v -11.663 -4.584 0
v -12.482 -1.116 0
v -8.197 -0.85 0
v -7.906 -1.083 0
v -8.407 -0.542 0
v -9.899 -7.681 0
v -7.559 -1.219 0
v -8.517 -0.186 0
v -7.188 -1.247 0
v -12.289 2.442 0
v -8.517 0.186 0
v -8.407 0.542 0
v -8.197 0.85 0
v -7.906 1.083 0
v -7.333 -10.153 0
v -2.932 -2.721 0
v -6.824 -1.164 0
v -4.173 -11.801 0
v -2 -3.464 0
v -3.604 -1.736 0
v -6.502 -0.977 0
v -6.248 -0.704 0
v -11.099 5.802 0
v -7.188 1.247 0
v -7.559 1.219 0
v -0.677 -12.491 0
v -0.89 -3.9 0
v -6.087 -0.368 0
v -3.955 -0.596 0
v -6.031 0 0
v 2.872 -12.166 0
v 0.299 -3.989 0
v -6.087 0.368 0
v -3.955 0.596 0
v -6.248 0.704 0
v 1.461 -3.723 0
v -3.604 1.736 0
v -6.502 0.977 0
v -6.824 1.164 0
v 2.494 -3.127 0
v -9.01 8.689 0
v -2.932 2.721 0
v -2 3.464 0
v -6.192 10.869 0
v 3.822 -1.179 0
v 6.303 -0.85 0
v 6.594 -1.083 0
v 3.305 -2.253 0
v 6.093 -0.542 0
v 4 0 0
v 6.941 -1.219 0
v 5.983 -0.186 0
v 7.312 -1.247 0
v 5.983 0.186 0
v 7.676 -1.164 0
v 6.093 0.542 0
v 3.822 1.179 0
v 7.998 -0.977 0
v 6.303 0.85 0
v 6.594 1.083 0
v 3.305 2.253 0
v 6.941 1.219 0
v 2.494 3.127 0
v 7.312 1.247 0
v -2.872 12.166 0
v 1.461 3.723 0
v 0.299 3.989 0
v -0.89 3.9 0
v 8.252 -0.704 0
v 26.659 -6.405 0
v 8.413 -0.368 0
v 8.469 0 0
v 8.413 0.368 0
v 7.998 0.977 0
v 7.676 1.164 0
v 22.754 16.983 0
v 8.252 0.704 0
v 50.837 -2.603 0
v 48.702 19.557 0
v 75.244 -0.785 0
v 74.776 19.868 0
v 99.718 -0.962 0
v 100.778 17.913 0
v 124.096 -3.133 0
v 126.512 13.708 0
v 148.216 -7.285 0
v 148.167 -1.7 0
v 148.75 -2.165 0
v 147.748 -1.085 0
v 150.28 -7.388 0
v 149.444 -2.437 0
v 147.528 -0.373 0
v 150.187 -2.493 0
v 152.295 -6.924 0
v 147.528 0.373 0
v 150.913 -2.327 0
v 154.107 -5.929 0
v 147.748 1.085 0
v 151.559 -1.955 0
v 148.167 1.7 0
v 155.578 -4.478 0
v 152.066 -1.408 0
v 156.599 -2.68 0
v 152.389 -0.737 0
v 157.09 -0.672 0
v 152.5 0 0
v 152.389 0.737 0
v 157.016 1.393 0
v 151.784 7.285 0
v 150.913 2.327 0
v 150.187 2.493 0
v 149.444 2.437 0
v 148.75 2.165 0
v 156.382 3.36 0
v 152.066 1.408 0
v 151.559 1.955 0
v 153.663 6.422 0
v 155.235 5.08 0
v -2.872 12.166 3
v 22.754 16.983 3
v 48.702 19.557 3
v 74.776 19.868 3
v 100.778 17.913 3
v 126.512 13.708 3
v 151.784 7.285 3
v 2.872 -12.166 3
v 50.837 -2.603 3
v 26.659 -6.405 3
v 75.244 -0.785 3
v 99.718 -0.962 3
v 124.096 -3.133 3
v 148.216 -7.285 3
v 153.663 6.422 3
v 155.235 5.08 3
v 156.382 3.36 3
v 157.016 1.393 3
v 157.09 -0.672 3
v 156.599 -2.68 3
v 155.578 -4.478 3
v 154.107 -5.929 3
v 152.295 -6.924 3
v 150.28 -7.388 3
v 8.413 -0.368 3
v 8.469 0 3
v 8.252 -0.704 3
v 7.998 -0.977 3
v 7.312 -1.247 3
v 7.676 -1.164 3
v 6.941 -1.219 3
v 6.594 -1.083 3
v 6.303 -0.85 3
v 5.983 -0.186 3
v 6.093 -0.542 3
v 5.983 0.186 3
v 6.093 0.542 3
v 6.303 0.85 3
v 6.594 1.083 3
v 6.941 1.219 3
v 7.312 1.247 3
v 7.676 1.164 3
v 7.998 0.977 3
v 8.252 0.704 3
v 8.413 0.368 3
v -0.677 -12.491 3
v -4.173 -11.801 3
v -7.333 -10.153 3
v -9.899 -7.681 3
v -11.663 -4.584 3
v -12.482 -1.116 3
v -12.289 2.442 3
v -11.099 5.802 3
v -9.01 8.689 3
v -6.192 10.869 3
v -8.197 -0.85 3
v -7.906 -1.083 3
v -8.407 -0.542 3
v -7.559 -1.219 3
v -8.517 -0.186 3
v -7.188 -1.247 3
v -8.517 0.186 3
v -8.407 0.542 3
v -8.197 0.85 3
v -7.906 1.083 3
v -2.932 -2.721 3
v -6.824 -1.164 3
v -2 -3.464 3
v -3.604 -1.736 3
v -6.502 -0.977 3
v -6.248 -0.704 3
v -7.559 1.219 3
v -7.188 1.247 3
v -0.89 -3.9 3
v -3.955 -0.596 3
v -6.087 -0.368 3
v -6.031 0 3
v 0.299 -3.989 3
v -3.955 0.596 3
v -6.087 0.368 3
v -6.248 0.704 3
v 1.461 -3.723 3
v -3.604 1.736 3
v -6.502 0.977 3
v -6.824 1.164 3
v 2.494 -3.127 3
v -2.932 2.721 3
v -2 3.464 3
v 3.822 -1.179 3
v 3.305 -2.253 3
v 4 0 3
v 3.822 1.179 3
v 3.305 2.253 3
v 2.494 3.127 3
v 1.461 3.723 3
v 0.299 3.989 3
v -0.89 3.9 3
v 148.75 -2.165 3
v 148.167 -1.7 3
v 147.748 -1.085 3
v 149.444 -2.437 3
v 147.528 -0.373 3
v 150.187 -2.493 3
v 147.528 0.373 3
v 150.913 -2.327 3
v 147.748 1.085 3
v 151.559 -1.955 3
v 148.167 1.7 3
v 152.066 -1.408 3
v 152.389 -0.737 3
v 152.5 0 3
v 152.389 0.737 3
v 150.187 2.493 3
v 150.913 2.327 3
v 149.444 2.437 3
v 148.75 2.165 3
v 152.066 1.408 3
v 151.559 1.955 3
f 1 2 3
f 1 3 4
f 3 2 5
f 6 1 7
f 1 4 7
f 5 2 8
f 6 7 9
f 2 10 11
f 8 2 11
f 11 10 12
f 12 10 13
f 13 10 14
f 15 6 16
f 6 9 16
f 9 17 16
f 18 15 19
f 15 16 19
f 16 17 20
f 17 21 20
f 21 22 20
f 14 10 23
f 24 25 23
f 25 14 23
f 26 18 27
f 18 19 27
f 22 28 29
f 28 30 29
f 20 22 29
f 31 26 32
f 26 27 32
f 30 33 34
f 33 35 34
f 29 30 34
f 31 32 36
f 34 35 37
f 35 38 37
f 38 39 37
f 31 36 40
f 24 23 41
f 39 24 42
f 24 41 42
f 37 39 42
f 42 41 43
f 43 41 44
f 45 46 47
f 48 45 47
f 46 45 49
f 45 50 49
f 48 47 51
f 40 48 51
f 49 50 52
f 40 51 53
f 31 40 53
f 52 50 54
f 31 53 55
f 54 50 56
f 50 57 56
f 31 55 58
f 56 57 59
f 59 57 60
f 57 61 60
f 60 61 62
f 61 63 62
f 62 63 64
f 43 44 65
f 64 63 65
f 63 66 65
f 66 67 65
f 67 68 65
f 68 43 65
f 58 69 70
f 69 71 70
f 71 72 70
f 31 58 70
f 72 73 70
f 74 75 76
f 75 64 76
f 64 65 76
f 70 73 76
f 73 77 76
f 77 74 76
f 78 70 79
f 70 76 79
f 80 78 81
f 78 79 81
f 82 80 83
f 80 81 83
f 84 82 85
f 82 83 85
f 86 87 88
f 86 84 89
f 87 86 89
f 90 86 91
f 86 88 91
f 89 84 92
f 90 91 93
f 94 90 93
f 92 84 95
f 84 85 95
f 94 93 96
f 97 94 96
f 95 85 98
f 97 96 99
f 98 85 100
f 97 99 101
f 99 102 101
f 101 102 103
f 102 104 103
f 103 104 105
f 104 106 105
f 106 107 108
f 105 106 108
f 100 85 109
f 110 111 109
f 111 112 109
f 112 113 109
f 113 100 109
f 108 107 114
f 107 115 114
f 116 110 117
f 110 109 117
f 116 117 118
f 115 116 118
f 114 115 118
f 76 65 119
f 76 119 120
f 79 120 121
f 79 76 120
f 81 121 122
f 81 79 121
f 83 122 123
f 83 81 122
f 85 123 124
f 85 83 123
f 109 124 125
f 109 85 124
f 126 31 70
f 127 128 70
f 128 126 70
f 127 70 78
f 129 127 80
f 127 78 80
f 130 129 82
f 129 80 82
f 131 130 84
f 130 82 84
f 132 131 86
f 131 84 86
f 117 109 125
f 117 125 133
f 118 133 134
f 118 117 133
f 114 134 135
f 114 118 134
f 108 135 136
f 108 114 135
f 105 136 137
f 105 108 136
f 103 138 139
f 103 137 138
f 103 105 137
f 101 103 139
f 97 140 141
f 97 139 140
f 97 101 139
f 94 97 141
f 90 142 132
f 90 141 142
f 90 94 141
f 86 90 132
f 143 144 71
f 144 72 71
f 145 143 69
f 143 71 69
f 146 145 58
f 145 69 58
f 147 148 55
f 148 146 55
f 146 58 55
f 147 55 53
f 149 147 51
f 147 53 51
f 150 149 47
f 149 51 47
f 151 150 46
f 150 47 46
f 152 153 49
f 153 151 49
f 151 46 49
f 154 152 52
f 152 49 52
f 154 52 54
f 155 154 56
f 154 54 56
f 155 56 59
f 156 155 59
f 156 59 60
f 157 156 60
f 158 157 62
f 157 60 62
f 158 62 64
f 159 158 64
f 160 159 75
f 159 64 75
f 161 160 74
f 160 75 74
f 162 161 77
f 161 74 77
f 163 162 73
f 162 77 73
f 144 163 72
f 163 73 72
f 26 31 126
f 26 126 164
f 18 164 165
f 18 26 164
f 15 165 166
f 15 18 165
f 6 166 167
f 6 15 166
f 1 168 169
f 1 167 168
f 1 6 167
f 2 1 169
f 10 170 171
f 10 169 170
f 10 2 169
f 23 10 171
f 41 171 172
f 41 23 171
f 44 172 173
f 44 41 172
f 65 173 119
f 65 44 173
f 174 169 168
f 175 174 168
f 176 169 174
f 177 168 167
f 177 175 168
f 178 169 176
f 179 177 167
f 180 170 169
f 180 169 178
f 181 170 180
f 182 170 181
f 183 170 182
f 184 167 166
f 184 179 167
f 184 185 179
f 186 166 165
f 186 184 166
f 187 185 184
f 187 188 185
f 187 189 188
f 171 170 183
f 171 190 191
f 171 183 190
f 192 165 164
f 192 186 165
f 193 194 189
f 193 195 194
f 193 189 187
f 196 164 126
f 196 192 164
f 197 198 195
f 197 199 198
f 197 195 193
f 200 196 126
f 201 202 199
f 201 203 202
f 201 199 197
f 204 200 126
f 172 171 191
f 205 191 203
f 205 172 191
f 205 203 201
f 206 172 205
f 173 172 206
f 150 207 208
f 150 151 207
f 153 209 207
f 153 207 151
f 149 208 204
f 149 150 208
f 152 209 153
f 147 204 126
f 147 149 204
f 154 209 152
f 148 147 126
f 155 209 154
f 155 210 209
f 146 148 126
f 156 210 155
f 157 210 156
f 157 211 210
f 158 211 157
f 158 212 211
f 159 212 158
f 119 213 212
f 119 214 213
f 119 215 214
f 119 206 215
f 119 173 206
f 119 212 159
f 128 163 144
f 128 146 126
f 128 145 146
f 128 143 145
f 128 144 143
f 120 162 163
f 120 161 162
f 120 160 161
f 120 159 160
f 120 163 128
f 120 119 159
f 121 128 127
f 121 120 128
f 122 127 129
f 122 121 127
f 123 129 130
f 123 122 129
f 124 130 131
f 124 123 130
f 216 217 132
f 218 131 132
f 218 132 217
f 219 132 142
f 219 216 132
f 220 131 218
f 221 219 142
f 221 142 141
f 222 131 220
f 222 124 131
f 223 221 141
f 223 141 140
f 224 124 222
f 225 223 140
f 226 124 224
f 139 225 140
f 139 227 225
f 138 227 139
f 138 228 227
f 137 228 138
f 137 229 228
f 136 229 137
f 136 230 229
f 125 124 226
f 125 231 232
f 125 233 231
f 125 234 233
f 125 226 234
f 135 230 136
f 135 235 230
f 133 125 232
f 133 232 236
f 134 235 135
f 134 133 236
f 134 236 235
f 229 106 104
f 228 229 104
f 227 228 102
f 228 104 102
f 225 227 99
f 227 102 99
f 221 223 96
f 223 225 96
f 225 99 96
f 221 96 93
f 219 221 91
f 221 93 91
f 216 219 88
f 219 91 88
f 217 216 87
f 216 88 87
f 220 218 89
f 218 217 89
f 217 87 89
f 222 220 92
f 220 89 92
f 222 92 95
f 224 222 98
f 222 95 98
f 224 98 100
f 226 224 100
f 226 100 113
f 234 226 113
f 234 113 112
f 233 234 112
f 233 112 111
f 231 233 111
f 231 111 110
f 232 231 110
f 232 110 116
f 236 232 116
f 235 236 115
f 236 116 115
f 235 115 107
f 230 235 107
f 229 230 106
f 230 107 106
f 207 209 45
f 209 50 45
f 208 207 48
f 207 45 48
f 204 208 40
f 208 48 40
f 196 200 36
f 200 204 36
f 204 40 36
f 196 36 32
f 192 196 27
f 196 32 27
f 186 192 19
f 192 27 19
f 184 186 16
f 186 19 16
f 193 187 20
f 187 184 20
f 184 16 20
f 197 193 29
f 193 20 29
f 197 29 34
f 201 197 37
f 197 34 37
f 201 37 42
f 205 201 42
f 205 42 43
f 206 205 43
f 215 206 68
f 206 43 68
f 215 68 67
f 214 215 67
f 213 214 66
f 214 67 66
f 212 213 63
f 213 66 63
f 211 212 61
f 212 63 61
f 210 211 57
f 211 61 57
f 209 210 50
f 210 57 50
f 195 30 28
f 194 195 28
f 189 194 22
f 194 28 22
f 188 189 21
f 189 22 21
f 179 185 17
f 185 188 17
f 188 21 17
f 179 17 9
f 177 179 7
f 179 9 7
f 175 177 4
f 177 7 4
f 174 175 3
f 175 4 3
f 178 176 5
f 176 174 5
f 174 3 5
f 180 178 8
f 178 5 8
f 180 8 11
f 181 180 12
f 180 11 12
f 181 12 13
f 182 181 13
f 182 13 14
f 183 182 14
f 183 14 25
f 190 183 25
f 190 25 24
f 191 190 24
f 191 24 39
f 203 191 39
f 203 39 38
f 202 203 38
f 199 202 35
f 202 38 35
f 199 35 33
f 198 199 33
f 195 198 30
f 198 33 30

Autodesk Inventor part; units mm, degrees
ref_plane "YZ Plane" through (0, 0, 0) normal (1, 0, 0) x (0, 1, 0)
ref_plane "XZ Plane" through (0, 0, 0) normal (0, 1, 0) x (-1, 0, 0)
ref_plane "XY Plane" through (0, 0, 0) normal (0, 0, 1) x (1, 0, 0)
sketch "Sketch1" plane through (0, 0, 0) normal (0, 0, 1) x (1, 0, 0)
  line L0 (0, 0) -> (150, 0) construction
  circle A0 centre (0, 0) radius 4
  circle A1 centre (0, 0) radius 12.5 construction
  circle A2 centre (150, 0) radius 2.5
  circle A3 centre (150, 0) radius 7.5 construction
  arc A4 (150, 0) -> (0, 0) centre (75, -290.4738) ccw construction
  line L1 (-4.0971, 17.3539) -> (0, 0) construction
  line L2 (0, 0) -> (12.1656, 2.8722) construction
  line L3 (0, 0) -> (3.4621, -14.6644) construction
  line L4 (147.6861, -9.448) -> (150, 0) construction
  line L5 (150, 0) -> (152.7079, 11.057) construction
  line L6 (150, 0) -> (150, 0) construction
  line L7 (150, 0) -> (142.7153, 1.7841) construction
  arc A5 (151.7841, 7.2847) -> (-2.8722, 12.1656) centre (65.313, -279.983) ccw
  arc A6 (148.2159, -7.2847) -> (2.8722, -12.1656) centre (85.3125, -300.6159) ccw
  arc A7 (-2.8722, 12.1656) -> (2.8722, -12.1656) centre (-0.0311, -0.0073) ccw
  arc A8 (148.2159, -7.2847) -> (151.7841, 7.2847) centre (149.6194, 0.0932) ccw
  circle A9 centre (-0.0311, -0.0073) radius 7.25 construction
  circle A10 centre (-7.2811, 0) radius 1.25
  circle A11 centre (7.2189, 0) radius 1.25
  dimension "d0" = 150
  dimension "d1" = 8
  dimension "d2" = 25
  dimension "d3" = 5
  dimension "d4" = 15
  dimension "d6" = 300
  dimension "d7" = 90
  dimension "d8" = 180
  dimension "d9" = 180
  dimension "d10" = 90
  dimension "d11" = 300
  dimension "d12" = 300
  dimension "d13" = 14.5
  dimension "d14" = 2.5
  dimension "d15" = 2.5
extrude "Extrusion1" add sketch "Sketch1" along normal blind 3
properties part number "brazo"
